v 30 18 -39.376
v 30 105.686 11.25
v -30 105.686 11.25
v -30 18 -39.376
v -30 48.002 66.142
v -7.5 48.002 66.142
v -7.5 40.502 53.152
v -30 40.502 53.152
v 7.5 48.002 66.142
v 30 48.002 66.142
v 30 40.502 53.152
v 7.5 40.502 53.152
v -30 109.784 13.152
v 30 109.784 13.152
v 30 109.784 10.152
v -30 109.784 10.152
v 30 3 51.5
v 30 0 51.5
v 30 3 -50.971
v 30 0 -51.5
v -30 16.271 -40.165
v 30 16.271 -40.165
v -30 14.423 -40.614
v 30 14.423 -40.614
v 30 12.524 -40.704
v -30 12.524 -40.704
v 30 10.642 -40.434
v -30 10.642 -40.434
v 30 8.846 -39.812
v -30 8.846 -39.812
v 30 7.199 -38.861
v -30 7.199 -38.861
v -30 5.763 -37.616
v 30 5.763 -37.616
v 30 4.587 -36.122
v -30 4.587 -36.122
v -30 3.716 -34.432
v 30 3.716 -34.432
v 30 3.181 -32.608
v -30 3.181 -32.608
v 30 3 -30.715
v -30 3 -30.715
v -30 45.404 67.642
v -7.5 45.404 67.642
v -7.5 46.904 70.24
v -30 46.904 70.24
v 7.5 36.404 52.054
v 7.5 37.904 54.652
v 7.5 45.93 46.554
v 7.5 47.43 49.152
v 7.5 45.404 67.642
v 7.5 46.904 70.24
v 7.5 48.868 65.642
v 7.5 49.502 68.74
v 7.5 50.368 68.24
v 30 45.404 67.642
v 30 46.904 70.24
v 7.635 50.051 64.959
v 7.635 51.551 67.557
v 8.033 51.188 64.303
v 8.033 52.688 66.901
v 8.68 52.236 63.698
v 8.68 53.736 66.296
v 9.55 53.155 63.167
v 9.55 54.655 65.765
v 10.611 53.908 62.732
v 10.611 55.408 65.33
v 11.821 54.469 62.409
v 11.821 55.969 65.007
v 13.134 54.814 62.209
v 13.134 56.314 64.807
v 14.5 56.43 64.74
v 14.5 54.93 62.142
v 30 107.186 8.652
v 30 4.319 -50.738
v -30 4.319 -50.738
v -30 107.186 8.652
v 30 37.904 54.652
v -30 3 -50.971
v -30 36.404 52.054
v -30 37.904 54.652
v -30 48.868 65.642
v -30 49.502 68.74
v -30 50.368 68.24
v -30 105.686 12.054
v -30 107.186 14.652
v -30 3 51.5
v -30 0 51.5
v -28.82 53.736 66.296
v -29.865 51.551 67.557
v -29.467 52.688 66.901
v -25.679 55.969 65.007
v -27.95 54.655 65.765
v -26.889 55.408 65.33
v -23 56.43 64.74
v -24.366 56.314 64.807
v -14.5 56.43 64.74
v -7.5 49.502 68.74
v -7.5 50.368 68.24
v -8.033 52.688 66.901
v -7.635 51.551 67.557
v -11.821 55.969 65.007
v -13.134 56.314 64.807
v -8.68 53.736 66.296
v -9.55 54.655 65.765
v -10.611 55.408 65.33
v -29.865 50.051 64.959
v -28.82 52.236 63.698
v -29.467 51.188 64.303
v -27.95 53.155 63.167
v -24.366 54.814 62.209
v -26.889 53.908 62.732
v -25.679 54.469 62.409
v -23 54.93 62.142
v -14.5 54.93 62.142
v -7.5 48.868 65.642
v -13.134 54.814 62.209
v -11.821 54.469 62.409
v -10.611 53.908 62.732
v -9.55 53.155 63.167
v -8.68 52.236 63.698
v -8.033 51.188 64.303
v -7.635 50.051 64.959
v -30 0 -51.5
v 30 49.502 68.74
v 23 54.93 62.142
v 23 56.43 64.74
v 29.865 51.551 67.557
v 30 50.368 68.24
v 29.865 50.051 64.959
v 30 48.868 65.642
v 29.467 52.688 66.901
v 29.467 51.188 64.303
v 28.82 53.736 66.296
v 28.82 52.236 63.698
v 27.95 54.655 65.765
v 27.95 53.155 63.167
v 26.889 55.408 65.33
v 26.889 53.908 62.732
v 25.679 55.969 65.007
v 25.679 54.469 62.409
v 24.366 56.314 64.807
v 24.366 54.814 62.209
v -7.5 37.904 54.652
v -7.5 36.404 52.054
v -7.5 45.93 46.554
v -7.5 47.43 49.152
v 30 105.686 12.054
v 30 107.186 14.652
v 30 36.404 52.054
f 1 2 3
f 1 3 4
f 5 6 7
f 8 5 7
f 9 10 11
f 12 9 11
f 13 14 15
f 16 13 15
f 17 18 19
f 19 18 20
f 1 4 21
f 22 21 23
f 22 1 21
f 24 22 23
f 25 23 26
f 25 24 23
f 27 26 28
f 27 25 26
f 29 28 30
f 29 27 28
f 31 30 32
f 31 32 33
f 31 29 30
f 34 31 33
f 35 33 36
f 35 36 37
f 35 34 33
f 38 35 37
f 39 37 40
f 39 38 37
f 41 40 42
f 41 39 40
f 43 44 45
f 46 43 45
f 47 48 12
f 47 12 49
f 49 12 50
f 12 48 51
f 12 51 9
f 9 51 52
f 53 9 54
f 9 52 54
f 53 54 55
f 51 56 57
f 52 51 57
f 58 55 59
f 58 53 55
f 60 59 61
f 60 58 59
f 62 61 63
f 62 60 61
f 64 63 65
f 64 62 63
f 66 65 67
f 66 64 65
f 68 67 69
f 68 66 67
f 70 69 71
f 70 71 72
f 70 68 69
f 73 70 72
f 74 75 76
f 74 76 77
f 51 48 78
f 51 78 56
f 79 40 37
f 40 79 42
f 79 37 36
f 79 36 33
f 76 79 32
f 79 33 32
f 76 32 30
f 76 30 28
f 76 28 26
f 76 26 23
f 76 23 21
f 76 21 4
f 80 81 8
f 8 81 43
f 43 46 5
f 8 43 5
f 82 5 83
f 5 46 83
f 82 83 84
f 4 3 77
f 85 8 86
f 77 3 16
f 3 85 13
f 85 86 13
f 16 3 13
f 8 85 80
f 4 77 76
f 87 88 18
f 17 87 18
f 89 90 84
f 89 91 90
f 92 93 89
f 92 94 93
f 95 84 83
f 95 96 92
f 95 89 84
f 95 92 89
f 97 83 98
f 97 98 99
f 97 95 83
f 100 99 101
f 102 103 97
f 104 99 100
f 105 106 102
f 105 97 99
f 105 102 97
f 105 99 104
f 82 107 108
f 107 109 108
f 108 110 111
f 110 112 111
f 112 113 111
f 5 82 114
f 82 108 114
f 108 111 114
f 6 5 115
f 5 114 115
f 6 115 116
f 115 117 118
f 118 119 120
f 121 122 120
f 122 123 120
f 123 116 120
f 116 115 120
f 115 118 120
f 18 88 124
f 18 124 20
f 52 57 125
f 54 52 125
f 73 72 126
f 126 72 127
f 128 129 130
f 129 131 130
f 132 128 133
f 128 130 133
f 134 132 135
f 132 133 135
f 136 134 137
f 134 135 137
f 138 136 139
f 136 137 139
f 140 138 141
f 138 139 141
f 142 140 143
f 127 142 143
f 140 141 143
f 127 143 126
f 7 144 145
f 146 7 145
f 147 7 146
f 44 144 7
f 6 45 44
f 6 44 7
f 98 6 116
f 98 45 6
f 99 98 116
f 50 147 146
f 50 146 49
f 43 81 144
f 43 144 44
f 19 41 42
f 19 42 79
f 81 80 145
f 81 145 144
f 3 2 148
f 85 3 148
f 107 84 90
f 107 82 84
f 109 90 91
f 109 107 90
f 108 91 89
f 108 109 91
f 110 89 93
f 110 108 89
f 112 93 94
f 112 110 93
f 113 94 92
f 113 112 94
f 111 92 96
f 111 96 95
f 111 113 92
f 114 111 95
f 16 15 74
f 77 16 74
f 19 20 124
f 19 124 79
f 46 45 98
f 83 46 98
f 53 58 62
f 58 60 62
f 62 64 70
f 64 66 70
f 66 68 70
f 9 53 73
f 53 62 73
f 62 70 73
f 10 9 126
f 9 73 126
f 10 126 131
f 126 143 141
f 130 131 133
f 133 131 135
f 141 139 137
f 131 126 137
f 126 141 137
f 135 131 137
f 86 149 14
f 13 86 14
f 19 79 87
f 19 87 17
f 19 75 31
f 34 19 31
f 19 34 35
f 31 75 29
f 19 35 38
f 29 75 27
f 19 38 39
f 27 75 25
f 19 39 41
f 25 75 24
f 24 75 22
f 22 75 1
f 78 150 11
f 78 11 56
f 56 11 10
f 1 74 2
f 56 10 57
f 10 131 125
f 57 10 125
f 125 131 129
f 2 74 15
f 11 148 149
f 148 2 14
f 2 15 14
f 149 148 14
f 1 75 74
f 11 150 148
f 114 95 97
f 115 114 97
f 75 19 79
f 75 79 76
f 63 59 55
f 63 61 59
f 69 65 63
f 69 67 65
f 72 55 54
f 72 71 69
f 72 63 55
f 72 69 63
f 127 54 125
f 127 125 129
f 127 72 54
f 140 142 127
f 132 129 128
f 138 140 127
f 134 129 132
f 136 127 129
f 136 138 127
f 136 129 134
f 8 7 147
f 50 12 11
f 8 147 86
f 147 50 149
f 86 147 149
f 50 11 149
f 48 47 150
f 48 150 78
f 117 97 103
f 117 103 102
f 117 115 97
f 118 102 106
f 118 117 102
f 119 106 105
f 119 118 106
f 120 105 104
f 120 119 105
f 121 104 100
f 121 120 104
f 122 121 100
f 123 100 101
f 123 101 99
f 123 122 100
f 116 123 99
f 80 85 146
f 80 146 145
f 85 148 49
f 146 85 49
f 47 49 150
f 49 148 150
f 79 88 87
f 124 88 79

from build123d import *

# Parameters (mm, degrees)
SKETCH1_W           = 60
SKETCH1_H           = 103
BOSS_EXTRUDE1_DEPTH = 3
BASE_FLANGE1_DEPTH  = 60
TAB2_DEPTH          = 60
SKETCH15_W          = 15
SKETCH15_H          = 11
CUT_EXTRUDE2_DEPTH  = 29
SKETCH16_W          = 22.5
SKETCH16_H          = 8
BOSS_EXTRUDE2_DEPTH = 3
FILLET1_R           = 7
CUT_EXTRUDE3_DEPTH  = 90


# Sheet-metal steps are written as plain solids
with BuildPart() as part:
    # Sketch1 → Boss-Extrude1 (new body)
    with BuildSketch(Plane(origin=(0, 0, 0), x_dir=(1, 0, 0), z_dir=(0, 1, 0))):
        Rectangle(SKETCH1_W, SKETCH1_H)
    extrude(amount=BOSS_EXTRUDE1_DEPTH)


with BuildPart() as body_2:
    # Sketch3 → Base-Flange1 (new body)
    with BuildSketch(Plane(origin=(30, 0, 0), x_dir=(0, 0, -1), z_dir=(1, 0, 0))):
        with BuildLine():
            Line((51.5, 3), (-8.651739219, 107.185868491))
            Line((-8.651739219, 107.185868491), (-11.249815431, 105.685868491))
            Line((-11.249815431, 105.685868491), (39.375644347, 18))
            ThreePointArc((39.375644347, 18), (39.375644347, 8), (30.715390309, 3))
            Line((30.715390309, 3), (48.035898385, 3))
            Line((48.035898385, 3), (51.5, 3))
        make_face()
    extrude(amount=-BASE_FLANGE1_DEPTH)

    # Sketch8 → Tab2 (add)
    with BuildSketch(Plane(origin=(30, 0, 0), x_dir=(0, 0, -1), z_dir=(1, 0, 0))):
        Polygon((-14.651739219, 107.185868491), (-13.151739219, 109.783944703), (-10.151739219, 109.783944703), (-8.651739219, 107.185868491), (-11.249815431, 105.685868491), (-12.053663008, 105.685868491), (-52.053663008, 36.403836188), (-54.651739219, 37.903836188), (-67.642120276, 45.403836188), (-70.240196487, 46.903836188), (-68.740196487, 49.5019124), (-66.142120276, 48.0019124), (-53.151739219, 40.5019124), align=None)
    extrude(amount=-TAB2_DEPTH)

    # Sketch15 → Cut-Extrude2 (cut, symmetric)
    with BuildSketch(Plane(origin=(0, 33.14085631, 57.401646934), x_dir=(1, 0, 0), z_dir=(0, 0.5000000000000021, 0.8660254037844374))):
        with Locations((0, 10.999815431)):
            Rectangle(SKETCH15_W, SKETCH15_H)
    extrude(amount=CUT_EXTRUDE2_DEPTH, both=True, mode=Mode.SUBTRACT)

    # Sketch16 → Boss-Extrude2 (add)
    with BuildSketch(Plane(origin=(0, 42.14085631, 72.990104203), x_dir=(1, 0, 0), z_dir=(0, 0.4999999999999961, 0.866025403784441))):
        with Locations((-18.75, 12.499815431)):
            Rectangle(SKETCH16_W, SKETCH16_H)
        with Locations((18.75, 12.499815431)):
            Rectangle(SKETCH16_W, SKETCH16_H)
    extrude(amount=-BOSS_EXTRUDE2_DEPTH)

    # Fillet1
    fillet1_edges = [body_2.edges().sort_by_distance(p)[0] for p in [
        (-30, 55.68011563, 63.441158382),
        (-7.5, 55.68011563, 63.441158382),
        (7.5, 55.68011563, 63.441158382),
        (30, 55.68011563, 63.441158382),
    ]]
    fillet(fillet1_edges, radius=FILLET1_R)


with BuildPart() as cut_extrude3_tool:
    # Sketch17 → Cut-Extrude3 (new body)
    with BuildSketch(Plane(origin=(30, 0, 0), x_dir=(0, 0, -1), z_dir=(1, 0, 0))):
        Polygon((51.5, 0), (50.738430041, 4.319077862), (51.5, 3), align=None)
    extrude(amount=-CUT_EXTRUDE3_DEPTH)


with BuildPart() as part_1:
    add(part.part)

    # Cut-Extrude3: cut by cut_extrude3_tool
    add(cut_extrude3_tool.part, mode=Mode.SUBTRACT)


with BuildPart() as body_2_1:
    add(body_2.part)

    # Cut-Extrude3: cut by cut_extrude3_tool
    add(cut_extrude3_tool.part, mode=Mode.SUBTRACT)


solid = Compound([part_1.part, body_2_1.part])
